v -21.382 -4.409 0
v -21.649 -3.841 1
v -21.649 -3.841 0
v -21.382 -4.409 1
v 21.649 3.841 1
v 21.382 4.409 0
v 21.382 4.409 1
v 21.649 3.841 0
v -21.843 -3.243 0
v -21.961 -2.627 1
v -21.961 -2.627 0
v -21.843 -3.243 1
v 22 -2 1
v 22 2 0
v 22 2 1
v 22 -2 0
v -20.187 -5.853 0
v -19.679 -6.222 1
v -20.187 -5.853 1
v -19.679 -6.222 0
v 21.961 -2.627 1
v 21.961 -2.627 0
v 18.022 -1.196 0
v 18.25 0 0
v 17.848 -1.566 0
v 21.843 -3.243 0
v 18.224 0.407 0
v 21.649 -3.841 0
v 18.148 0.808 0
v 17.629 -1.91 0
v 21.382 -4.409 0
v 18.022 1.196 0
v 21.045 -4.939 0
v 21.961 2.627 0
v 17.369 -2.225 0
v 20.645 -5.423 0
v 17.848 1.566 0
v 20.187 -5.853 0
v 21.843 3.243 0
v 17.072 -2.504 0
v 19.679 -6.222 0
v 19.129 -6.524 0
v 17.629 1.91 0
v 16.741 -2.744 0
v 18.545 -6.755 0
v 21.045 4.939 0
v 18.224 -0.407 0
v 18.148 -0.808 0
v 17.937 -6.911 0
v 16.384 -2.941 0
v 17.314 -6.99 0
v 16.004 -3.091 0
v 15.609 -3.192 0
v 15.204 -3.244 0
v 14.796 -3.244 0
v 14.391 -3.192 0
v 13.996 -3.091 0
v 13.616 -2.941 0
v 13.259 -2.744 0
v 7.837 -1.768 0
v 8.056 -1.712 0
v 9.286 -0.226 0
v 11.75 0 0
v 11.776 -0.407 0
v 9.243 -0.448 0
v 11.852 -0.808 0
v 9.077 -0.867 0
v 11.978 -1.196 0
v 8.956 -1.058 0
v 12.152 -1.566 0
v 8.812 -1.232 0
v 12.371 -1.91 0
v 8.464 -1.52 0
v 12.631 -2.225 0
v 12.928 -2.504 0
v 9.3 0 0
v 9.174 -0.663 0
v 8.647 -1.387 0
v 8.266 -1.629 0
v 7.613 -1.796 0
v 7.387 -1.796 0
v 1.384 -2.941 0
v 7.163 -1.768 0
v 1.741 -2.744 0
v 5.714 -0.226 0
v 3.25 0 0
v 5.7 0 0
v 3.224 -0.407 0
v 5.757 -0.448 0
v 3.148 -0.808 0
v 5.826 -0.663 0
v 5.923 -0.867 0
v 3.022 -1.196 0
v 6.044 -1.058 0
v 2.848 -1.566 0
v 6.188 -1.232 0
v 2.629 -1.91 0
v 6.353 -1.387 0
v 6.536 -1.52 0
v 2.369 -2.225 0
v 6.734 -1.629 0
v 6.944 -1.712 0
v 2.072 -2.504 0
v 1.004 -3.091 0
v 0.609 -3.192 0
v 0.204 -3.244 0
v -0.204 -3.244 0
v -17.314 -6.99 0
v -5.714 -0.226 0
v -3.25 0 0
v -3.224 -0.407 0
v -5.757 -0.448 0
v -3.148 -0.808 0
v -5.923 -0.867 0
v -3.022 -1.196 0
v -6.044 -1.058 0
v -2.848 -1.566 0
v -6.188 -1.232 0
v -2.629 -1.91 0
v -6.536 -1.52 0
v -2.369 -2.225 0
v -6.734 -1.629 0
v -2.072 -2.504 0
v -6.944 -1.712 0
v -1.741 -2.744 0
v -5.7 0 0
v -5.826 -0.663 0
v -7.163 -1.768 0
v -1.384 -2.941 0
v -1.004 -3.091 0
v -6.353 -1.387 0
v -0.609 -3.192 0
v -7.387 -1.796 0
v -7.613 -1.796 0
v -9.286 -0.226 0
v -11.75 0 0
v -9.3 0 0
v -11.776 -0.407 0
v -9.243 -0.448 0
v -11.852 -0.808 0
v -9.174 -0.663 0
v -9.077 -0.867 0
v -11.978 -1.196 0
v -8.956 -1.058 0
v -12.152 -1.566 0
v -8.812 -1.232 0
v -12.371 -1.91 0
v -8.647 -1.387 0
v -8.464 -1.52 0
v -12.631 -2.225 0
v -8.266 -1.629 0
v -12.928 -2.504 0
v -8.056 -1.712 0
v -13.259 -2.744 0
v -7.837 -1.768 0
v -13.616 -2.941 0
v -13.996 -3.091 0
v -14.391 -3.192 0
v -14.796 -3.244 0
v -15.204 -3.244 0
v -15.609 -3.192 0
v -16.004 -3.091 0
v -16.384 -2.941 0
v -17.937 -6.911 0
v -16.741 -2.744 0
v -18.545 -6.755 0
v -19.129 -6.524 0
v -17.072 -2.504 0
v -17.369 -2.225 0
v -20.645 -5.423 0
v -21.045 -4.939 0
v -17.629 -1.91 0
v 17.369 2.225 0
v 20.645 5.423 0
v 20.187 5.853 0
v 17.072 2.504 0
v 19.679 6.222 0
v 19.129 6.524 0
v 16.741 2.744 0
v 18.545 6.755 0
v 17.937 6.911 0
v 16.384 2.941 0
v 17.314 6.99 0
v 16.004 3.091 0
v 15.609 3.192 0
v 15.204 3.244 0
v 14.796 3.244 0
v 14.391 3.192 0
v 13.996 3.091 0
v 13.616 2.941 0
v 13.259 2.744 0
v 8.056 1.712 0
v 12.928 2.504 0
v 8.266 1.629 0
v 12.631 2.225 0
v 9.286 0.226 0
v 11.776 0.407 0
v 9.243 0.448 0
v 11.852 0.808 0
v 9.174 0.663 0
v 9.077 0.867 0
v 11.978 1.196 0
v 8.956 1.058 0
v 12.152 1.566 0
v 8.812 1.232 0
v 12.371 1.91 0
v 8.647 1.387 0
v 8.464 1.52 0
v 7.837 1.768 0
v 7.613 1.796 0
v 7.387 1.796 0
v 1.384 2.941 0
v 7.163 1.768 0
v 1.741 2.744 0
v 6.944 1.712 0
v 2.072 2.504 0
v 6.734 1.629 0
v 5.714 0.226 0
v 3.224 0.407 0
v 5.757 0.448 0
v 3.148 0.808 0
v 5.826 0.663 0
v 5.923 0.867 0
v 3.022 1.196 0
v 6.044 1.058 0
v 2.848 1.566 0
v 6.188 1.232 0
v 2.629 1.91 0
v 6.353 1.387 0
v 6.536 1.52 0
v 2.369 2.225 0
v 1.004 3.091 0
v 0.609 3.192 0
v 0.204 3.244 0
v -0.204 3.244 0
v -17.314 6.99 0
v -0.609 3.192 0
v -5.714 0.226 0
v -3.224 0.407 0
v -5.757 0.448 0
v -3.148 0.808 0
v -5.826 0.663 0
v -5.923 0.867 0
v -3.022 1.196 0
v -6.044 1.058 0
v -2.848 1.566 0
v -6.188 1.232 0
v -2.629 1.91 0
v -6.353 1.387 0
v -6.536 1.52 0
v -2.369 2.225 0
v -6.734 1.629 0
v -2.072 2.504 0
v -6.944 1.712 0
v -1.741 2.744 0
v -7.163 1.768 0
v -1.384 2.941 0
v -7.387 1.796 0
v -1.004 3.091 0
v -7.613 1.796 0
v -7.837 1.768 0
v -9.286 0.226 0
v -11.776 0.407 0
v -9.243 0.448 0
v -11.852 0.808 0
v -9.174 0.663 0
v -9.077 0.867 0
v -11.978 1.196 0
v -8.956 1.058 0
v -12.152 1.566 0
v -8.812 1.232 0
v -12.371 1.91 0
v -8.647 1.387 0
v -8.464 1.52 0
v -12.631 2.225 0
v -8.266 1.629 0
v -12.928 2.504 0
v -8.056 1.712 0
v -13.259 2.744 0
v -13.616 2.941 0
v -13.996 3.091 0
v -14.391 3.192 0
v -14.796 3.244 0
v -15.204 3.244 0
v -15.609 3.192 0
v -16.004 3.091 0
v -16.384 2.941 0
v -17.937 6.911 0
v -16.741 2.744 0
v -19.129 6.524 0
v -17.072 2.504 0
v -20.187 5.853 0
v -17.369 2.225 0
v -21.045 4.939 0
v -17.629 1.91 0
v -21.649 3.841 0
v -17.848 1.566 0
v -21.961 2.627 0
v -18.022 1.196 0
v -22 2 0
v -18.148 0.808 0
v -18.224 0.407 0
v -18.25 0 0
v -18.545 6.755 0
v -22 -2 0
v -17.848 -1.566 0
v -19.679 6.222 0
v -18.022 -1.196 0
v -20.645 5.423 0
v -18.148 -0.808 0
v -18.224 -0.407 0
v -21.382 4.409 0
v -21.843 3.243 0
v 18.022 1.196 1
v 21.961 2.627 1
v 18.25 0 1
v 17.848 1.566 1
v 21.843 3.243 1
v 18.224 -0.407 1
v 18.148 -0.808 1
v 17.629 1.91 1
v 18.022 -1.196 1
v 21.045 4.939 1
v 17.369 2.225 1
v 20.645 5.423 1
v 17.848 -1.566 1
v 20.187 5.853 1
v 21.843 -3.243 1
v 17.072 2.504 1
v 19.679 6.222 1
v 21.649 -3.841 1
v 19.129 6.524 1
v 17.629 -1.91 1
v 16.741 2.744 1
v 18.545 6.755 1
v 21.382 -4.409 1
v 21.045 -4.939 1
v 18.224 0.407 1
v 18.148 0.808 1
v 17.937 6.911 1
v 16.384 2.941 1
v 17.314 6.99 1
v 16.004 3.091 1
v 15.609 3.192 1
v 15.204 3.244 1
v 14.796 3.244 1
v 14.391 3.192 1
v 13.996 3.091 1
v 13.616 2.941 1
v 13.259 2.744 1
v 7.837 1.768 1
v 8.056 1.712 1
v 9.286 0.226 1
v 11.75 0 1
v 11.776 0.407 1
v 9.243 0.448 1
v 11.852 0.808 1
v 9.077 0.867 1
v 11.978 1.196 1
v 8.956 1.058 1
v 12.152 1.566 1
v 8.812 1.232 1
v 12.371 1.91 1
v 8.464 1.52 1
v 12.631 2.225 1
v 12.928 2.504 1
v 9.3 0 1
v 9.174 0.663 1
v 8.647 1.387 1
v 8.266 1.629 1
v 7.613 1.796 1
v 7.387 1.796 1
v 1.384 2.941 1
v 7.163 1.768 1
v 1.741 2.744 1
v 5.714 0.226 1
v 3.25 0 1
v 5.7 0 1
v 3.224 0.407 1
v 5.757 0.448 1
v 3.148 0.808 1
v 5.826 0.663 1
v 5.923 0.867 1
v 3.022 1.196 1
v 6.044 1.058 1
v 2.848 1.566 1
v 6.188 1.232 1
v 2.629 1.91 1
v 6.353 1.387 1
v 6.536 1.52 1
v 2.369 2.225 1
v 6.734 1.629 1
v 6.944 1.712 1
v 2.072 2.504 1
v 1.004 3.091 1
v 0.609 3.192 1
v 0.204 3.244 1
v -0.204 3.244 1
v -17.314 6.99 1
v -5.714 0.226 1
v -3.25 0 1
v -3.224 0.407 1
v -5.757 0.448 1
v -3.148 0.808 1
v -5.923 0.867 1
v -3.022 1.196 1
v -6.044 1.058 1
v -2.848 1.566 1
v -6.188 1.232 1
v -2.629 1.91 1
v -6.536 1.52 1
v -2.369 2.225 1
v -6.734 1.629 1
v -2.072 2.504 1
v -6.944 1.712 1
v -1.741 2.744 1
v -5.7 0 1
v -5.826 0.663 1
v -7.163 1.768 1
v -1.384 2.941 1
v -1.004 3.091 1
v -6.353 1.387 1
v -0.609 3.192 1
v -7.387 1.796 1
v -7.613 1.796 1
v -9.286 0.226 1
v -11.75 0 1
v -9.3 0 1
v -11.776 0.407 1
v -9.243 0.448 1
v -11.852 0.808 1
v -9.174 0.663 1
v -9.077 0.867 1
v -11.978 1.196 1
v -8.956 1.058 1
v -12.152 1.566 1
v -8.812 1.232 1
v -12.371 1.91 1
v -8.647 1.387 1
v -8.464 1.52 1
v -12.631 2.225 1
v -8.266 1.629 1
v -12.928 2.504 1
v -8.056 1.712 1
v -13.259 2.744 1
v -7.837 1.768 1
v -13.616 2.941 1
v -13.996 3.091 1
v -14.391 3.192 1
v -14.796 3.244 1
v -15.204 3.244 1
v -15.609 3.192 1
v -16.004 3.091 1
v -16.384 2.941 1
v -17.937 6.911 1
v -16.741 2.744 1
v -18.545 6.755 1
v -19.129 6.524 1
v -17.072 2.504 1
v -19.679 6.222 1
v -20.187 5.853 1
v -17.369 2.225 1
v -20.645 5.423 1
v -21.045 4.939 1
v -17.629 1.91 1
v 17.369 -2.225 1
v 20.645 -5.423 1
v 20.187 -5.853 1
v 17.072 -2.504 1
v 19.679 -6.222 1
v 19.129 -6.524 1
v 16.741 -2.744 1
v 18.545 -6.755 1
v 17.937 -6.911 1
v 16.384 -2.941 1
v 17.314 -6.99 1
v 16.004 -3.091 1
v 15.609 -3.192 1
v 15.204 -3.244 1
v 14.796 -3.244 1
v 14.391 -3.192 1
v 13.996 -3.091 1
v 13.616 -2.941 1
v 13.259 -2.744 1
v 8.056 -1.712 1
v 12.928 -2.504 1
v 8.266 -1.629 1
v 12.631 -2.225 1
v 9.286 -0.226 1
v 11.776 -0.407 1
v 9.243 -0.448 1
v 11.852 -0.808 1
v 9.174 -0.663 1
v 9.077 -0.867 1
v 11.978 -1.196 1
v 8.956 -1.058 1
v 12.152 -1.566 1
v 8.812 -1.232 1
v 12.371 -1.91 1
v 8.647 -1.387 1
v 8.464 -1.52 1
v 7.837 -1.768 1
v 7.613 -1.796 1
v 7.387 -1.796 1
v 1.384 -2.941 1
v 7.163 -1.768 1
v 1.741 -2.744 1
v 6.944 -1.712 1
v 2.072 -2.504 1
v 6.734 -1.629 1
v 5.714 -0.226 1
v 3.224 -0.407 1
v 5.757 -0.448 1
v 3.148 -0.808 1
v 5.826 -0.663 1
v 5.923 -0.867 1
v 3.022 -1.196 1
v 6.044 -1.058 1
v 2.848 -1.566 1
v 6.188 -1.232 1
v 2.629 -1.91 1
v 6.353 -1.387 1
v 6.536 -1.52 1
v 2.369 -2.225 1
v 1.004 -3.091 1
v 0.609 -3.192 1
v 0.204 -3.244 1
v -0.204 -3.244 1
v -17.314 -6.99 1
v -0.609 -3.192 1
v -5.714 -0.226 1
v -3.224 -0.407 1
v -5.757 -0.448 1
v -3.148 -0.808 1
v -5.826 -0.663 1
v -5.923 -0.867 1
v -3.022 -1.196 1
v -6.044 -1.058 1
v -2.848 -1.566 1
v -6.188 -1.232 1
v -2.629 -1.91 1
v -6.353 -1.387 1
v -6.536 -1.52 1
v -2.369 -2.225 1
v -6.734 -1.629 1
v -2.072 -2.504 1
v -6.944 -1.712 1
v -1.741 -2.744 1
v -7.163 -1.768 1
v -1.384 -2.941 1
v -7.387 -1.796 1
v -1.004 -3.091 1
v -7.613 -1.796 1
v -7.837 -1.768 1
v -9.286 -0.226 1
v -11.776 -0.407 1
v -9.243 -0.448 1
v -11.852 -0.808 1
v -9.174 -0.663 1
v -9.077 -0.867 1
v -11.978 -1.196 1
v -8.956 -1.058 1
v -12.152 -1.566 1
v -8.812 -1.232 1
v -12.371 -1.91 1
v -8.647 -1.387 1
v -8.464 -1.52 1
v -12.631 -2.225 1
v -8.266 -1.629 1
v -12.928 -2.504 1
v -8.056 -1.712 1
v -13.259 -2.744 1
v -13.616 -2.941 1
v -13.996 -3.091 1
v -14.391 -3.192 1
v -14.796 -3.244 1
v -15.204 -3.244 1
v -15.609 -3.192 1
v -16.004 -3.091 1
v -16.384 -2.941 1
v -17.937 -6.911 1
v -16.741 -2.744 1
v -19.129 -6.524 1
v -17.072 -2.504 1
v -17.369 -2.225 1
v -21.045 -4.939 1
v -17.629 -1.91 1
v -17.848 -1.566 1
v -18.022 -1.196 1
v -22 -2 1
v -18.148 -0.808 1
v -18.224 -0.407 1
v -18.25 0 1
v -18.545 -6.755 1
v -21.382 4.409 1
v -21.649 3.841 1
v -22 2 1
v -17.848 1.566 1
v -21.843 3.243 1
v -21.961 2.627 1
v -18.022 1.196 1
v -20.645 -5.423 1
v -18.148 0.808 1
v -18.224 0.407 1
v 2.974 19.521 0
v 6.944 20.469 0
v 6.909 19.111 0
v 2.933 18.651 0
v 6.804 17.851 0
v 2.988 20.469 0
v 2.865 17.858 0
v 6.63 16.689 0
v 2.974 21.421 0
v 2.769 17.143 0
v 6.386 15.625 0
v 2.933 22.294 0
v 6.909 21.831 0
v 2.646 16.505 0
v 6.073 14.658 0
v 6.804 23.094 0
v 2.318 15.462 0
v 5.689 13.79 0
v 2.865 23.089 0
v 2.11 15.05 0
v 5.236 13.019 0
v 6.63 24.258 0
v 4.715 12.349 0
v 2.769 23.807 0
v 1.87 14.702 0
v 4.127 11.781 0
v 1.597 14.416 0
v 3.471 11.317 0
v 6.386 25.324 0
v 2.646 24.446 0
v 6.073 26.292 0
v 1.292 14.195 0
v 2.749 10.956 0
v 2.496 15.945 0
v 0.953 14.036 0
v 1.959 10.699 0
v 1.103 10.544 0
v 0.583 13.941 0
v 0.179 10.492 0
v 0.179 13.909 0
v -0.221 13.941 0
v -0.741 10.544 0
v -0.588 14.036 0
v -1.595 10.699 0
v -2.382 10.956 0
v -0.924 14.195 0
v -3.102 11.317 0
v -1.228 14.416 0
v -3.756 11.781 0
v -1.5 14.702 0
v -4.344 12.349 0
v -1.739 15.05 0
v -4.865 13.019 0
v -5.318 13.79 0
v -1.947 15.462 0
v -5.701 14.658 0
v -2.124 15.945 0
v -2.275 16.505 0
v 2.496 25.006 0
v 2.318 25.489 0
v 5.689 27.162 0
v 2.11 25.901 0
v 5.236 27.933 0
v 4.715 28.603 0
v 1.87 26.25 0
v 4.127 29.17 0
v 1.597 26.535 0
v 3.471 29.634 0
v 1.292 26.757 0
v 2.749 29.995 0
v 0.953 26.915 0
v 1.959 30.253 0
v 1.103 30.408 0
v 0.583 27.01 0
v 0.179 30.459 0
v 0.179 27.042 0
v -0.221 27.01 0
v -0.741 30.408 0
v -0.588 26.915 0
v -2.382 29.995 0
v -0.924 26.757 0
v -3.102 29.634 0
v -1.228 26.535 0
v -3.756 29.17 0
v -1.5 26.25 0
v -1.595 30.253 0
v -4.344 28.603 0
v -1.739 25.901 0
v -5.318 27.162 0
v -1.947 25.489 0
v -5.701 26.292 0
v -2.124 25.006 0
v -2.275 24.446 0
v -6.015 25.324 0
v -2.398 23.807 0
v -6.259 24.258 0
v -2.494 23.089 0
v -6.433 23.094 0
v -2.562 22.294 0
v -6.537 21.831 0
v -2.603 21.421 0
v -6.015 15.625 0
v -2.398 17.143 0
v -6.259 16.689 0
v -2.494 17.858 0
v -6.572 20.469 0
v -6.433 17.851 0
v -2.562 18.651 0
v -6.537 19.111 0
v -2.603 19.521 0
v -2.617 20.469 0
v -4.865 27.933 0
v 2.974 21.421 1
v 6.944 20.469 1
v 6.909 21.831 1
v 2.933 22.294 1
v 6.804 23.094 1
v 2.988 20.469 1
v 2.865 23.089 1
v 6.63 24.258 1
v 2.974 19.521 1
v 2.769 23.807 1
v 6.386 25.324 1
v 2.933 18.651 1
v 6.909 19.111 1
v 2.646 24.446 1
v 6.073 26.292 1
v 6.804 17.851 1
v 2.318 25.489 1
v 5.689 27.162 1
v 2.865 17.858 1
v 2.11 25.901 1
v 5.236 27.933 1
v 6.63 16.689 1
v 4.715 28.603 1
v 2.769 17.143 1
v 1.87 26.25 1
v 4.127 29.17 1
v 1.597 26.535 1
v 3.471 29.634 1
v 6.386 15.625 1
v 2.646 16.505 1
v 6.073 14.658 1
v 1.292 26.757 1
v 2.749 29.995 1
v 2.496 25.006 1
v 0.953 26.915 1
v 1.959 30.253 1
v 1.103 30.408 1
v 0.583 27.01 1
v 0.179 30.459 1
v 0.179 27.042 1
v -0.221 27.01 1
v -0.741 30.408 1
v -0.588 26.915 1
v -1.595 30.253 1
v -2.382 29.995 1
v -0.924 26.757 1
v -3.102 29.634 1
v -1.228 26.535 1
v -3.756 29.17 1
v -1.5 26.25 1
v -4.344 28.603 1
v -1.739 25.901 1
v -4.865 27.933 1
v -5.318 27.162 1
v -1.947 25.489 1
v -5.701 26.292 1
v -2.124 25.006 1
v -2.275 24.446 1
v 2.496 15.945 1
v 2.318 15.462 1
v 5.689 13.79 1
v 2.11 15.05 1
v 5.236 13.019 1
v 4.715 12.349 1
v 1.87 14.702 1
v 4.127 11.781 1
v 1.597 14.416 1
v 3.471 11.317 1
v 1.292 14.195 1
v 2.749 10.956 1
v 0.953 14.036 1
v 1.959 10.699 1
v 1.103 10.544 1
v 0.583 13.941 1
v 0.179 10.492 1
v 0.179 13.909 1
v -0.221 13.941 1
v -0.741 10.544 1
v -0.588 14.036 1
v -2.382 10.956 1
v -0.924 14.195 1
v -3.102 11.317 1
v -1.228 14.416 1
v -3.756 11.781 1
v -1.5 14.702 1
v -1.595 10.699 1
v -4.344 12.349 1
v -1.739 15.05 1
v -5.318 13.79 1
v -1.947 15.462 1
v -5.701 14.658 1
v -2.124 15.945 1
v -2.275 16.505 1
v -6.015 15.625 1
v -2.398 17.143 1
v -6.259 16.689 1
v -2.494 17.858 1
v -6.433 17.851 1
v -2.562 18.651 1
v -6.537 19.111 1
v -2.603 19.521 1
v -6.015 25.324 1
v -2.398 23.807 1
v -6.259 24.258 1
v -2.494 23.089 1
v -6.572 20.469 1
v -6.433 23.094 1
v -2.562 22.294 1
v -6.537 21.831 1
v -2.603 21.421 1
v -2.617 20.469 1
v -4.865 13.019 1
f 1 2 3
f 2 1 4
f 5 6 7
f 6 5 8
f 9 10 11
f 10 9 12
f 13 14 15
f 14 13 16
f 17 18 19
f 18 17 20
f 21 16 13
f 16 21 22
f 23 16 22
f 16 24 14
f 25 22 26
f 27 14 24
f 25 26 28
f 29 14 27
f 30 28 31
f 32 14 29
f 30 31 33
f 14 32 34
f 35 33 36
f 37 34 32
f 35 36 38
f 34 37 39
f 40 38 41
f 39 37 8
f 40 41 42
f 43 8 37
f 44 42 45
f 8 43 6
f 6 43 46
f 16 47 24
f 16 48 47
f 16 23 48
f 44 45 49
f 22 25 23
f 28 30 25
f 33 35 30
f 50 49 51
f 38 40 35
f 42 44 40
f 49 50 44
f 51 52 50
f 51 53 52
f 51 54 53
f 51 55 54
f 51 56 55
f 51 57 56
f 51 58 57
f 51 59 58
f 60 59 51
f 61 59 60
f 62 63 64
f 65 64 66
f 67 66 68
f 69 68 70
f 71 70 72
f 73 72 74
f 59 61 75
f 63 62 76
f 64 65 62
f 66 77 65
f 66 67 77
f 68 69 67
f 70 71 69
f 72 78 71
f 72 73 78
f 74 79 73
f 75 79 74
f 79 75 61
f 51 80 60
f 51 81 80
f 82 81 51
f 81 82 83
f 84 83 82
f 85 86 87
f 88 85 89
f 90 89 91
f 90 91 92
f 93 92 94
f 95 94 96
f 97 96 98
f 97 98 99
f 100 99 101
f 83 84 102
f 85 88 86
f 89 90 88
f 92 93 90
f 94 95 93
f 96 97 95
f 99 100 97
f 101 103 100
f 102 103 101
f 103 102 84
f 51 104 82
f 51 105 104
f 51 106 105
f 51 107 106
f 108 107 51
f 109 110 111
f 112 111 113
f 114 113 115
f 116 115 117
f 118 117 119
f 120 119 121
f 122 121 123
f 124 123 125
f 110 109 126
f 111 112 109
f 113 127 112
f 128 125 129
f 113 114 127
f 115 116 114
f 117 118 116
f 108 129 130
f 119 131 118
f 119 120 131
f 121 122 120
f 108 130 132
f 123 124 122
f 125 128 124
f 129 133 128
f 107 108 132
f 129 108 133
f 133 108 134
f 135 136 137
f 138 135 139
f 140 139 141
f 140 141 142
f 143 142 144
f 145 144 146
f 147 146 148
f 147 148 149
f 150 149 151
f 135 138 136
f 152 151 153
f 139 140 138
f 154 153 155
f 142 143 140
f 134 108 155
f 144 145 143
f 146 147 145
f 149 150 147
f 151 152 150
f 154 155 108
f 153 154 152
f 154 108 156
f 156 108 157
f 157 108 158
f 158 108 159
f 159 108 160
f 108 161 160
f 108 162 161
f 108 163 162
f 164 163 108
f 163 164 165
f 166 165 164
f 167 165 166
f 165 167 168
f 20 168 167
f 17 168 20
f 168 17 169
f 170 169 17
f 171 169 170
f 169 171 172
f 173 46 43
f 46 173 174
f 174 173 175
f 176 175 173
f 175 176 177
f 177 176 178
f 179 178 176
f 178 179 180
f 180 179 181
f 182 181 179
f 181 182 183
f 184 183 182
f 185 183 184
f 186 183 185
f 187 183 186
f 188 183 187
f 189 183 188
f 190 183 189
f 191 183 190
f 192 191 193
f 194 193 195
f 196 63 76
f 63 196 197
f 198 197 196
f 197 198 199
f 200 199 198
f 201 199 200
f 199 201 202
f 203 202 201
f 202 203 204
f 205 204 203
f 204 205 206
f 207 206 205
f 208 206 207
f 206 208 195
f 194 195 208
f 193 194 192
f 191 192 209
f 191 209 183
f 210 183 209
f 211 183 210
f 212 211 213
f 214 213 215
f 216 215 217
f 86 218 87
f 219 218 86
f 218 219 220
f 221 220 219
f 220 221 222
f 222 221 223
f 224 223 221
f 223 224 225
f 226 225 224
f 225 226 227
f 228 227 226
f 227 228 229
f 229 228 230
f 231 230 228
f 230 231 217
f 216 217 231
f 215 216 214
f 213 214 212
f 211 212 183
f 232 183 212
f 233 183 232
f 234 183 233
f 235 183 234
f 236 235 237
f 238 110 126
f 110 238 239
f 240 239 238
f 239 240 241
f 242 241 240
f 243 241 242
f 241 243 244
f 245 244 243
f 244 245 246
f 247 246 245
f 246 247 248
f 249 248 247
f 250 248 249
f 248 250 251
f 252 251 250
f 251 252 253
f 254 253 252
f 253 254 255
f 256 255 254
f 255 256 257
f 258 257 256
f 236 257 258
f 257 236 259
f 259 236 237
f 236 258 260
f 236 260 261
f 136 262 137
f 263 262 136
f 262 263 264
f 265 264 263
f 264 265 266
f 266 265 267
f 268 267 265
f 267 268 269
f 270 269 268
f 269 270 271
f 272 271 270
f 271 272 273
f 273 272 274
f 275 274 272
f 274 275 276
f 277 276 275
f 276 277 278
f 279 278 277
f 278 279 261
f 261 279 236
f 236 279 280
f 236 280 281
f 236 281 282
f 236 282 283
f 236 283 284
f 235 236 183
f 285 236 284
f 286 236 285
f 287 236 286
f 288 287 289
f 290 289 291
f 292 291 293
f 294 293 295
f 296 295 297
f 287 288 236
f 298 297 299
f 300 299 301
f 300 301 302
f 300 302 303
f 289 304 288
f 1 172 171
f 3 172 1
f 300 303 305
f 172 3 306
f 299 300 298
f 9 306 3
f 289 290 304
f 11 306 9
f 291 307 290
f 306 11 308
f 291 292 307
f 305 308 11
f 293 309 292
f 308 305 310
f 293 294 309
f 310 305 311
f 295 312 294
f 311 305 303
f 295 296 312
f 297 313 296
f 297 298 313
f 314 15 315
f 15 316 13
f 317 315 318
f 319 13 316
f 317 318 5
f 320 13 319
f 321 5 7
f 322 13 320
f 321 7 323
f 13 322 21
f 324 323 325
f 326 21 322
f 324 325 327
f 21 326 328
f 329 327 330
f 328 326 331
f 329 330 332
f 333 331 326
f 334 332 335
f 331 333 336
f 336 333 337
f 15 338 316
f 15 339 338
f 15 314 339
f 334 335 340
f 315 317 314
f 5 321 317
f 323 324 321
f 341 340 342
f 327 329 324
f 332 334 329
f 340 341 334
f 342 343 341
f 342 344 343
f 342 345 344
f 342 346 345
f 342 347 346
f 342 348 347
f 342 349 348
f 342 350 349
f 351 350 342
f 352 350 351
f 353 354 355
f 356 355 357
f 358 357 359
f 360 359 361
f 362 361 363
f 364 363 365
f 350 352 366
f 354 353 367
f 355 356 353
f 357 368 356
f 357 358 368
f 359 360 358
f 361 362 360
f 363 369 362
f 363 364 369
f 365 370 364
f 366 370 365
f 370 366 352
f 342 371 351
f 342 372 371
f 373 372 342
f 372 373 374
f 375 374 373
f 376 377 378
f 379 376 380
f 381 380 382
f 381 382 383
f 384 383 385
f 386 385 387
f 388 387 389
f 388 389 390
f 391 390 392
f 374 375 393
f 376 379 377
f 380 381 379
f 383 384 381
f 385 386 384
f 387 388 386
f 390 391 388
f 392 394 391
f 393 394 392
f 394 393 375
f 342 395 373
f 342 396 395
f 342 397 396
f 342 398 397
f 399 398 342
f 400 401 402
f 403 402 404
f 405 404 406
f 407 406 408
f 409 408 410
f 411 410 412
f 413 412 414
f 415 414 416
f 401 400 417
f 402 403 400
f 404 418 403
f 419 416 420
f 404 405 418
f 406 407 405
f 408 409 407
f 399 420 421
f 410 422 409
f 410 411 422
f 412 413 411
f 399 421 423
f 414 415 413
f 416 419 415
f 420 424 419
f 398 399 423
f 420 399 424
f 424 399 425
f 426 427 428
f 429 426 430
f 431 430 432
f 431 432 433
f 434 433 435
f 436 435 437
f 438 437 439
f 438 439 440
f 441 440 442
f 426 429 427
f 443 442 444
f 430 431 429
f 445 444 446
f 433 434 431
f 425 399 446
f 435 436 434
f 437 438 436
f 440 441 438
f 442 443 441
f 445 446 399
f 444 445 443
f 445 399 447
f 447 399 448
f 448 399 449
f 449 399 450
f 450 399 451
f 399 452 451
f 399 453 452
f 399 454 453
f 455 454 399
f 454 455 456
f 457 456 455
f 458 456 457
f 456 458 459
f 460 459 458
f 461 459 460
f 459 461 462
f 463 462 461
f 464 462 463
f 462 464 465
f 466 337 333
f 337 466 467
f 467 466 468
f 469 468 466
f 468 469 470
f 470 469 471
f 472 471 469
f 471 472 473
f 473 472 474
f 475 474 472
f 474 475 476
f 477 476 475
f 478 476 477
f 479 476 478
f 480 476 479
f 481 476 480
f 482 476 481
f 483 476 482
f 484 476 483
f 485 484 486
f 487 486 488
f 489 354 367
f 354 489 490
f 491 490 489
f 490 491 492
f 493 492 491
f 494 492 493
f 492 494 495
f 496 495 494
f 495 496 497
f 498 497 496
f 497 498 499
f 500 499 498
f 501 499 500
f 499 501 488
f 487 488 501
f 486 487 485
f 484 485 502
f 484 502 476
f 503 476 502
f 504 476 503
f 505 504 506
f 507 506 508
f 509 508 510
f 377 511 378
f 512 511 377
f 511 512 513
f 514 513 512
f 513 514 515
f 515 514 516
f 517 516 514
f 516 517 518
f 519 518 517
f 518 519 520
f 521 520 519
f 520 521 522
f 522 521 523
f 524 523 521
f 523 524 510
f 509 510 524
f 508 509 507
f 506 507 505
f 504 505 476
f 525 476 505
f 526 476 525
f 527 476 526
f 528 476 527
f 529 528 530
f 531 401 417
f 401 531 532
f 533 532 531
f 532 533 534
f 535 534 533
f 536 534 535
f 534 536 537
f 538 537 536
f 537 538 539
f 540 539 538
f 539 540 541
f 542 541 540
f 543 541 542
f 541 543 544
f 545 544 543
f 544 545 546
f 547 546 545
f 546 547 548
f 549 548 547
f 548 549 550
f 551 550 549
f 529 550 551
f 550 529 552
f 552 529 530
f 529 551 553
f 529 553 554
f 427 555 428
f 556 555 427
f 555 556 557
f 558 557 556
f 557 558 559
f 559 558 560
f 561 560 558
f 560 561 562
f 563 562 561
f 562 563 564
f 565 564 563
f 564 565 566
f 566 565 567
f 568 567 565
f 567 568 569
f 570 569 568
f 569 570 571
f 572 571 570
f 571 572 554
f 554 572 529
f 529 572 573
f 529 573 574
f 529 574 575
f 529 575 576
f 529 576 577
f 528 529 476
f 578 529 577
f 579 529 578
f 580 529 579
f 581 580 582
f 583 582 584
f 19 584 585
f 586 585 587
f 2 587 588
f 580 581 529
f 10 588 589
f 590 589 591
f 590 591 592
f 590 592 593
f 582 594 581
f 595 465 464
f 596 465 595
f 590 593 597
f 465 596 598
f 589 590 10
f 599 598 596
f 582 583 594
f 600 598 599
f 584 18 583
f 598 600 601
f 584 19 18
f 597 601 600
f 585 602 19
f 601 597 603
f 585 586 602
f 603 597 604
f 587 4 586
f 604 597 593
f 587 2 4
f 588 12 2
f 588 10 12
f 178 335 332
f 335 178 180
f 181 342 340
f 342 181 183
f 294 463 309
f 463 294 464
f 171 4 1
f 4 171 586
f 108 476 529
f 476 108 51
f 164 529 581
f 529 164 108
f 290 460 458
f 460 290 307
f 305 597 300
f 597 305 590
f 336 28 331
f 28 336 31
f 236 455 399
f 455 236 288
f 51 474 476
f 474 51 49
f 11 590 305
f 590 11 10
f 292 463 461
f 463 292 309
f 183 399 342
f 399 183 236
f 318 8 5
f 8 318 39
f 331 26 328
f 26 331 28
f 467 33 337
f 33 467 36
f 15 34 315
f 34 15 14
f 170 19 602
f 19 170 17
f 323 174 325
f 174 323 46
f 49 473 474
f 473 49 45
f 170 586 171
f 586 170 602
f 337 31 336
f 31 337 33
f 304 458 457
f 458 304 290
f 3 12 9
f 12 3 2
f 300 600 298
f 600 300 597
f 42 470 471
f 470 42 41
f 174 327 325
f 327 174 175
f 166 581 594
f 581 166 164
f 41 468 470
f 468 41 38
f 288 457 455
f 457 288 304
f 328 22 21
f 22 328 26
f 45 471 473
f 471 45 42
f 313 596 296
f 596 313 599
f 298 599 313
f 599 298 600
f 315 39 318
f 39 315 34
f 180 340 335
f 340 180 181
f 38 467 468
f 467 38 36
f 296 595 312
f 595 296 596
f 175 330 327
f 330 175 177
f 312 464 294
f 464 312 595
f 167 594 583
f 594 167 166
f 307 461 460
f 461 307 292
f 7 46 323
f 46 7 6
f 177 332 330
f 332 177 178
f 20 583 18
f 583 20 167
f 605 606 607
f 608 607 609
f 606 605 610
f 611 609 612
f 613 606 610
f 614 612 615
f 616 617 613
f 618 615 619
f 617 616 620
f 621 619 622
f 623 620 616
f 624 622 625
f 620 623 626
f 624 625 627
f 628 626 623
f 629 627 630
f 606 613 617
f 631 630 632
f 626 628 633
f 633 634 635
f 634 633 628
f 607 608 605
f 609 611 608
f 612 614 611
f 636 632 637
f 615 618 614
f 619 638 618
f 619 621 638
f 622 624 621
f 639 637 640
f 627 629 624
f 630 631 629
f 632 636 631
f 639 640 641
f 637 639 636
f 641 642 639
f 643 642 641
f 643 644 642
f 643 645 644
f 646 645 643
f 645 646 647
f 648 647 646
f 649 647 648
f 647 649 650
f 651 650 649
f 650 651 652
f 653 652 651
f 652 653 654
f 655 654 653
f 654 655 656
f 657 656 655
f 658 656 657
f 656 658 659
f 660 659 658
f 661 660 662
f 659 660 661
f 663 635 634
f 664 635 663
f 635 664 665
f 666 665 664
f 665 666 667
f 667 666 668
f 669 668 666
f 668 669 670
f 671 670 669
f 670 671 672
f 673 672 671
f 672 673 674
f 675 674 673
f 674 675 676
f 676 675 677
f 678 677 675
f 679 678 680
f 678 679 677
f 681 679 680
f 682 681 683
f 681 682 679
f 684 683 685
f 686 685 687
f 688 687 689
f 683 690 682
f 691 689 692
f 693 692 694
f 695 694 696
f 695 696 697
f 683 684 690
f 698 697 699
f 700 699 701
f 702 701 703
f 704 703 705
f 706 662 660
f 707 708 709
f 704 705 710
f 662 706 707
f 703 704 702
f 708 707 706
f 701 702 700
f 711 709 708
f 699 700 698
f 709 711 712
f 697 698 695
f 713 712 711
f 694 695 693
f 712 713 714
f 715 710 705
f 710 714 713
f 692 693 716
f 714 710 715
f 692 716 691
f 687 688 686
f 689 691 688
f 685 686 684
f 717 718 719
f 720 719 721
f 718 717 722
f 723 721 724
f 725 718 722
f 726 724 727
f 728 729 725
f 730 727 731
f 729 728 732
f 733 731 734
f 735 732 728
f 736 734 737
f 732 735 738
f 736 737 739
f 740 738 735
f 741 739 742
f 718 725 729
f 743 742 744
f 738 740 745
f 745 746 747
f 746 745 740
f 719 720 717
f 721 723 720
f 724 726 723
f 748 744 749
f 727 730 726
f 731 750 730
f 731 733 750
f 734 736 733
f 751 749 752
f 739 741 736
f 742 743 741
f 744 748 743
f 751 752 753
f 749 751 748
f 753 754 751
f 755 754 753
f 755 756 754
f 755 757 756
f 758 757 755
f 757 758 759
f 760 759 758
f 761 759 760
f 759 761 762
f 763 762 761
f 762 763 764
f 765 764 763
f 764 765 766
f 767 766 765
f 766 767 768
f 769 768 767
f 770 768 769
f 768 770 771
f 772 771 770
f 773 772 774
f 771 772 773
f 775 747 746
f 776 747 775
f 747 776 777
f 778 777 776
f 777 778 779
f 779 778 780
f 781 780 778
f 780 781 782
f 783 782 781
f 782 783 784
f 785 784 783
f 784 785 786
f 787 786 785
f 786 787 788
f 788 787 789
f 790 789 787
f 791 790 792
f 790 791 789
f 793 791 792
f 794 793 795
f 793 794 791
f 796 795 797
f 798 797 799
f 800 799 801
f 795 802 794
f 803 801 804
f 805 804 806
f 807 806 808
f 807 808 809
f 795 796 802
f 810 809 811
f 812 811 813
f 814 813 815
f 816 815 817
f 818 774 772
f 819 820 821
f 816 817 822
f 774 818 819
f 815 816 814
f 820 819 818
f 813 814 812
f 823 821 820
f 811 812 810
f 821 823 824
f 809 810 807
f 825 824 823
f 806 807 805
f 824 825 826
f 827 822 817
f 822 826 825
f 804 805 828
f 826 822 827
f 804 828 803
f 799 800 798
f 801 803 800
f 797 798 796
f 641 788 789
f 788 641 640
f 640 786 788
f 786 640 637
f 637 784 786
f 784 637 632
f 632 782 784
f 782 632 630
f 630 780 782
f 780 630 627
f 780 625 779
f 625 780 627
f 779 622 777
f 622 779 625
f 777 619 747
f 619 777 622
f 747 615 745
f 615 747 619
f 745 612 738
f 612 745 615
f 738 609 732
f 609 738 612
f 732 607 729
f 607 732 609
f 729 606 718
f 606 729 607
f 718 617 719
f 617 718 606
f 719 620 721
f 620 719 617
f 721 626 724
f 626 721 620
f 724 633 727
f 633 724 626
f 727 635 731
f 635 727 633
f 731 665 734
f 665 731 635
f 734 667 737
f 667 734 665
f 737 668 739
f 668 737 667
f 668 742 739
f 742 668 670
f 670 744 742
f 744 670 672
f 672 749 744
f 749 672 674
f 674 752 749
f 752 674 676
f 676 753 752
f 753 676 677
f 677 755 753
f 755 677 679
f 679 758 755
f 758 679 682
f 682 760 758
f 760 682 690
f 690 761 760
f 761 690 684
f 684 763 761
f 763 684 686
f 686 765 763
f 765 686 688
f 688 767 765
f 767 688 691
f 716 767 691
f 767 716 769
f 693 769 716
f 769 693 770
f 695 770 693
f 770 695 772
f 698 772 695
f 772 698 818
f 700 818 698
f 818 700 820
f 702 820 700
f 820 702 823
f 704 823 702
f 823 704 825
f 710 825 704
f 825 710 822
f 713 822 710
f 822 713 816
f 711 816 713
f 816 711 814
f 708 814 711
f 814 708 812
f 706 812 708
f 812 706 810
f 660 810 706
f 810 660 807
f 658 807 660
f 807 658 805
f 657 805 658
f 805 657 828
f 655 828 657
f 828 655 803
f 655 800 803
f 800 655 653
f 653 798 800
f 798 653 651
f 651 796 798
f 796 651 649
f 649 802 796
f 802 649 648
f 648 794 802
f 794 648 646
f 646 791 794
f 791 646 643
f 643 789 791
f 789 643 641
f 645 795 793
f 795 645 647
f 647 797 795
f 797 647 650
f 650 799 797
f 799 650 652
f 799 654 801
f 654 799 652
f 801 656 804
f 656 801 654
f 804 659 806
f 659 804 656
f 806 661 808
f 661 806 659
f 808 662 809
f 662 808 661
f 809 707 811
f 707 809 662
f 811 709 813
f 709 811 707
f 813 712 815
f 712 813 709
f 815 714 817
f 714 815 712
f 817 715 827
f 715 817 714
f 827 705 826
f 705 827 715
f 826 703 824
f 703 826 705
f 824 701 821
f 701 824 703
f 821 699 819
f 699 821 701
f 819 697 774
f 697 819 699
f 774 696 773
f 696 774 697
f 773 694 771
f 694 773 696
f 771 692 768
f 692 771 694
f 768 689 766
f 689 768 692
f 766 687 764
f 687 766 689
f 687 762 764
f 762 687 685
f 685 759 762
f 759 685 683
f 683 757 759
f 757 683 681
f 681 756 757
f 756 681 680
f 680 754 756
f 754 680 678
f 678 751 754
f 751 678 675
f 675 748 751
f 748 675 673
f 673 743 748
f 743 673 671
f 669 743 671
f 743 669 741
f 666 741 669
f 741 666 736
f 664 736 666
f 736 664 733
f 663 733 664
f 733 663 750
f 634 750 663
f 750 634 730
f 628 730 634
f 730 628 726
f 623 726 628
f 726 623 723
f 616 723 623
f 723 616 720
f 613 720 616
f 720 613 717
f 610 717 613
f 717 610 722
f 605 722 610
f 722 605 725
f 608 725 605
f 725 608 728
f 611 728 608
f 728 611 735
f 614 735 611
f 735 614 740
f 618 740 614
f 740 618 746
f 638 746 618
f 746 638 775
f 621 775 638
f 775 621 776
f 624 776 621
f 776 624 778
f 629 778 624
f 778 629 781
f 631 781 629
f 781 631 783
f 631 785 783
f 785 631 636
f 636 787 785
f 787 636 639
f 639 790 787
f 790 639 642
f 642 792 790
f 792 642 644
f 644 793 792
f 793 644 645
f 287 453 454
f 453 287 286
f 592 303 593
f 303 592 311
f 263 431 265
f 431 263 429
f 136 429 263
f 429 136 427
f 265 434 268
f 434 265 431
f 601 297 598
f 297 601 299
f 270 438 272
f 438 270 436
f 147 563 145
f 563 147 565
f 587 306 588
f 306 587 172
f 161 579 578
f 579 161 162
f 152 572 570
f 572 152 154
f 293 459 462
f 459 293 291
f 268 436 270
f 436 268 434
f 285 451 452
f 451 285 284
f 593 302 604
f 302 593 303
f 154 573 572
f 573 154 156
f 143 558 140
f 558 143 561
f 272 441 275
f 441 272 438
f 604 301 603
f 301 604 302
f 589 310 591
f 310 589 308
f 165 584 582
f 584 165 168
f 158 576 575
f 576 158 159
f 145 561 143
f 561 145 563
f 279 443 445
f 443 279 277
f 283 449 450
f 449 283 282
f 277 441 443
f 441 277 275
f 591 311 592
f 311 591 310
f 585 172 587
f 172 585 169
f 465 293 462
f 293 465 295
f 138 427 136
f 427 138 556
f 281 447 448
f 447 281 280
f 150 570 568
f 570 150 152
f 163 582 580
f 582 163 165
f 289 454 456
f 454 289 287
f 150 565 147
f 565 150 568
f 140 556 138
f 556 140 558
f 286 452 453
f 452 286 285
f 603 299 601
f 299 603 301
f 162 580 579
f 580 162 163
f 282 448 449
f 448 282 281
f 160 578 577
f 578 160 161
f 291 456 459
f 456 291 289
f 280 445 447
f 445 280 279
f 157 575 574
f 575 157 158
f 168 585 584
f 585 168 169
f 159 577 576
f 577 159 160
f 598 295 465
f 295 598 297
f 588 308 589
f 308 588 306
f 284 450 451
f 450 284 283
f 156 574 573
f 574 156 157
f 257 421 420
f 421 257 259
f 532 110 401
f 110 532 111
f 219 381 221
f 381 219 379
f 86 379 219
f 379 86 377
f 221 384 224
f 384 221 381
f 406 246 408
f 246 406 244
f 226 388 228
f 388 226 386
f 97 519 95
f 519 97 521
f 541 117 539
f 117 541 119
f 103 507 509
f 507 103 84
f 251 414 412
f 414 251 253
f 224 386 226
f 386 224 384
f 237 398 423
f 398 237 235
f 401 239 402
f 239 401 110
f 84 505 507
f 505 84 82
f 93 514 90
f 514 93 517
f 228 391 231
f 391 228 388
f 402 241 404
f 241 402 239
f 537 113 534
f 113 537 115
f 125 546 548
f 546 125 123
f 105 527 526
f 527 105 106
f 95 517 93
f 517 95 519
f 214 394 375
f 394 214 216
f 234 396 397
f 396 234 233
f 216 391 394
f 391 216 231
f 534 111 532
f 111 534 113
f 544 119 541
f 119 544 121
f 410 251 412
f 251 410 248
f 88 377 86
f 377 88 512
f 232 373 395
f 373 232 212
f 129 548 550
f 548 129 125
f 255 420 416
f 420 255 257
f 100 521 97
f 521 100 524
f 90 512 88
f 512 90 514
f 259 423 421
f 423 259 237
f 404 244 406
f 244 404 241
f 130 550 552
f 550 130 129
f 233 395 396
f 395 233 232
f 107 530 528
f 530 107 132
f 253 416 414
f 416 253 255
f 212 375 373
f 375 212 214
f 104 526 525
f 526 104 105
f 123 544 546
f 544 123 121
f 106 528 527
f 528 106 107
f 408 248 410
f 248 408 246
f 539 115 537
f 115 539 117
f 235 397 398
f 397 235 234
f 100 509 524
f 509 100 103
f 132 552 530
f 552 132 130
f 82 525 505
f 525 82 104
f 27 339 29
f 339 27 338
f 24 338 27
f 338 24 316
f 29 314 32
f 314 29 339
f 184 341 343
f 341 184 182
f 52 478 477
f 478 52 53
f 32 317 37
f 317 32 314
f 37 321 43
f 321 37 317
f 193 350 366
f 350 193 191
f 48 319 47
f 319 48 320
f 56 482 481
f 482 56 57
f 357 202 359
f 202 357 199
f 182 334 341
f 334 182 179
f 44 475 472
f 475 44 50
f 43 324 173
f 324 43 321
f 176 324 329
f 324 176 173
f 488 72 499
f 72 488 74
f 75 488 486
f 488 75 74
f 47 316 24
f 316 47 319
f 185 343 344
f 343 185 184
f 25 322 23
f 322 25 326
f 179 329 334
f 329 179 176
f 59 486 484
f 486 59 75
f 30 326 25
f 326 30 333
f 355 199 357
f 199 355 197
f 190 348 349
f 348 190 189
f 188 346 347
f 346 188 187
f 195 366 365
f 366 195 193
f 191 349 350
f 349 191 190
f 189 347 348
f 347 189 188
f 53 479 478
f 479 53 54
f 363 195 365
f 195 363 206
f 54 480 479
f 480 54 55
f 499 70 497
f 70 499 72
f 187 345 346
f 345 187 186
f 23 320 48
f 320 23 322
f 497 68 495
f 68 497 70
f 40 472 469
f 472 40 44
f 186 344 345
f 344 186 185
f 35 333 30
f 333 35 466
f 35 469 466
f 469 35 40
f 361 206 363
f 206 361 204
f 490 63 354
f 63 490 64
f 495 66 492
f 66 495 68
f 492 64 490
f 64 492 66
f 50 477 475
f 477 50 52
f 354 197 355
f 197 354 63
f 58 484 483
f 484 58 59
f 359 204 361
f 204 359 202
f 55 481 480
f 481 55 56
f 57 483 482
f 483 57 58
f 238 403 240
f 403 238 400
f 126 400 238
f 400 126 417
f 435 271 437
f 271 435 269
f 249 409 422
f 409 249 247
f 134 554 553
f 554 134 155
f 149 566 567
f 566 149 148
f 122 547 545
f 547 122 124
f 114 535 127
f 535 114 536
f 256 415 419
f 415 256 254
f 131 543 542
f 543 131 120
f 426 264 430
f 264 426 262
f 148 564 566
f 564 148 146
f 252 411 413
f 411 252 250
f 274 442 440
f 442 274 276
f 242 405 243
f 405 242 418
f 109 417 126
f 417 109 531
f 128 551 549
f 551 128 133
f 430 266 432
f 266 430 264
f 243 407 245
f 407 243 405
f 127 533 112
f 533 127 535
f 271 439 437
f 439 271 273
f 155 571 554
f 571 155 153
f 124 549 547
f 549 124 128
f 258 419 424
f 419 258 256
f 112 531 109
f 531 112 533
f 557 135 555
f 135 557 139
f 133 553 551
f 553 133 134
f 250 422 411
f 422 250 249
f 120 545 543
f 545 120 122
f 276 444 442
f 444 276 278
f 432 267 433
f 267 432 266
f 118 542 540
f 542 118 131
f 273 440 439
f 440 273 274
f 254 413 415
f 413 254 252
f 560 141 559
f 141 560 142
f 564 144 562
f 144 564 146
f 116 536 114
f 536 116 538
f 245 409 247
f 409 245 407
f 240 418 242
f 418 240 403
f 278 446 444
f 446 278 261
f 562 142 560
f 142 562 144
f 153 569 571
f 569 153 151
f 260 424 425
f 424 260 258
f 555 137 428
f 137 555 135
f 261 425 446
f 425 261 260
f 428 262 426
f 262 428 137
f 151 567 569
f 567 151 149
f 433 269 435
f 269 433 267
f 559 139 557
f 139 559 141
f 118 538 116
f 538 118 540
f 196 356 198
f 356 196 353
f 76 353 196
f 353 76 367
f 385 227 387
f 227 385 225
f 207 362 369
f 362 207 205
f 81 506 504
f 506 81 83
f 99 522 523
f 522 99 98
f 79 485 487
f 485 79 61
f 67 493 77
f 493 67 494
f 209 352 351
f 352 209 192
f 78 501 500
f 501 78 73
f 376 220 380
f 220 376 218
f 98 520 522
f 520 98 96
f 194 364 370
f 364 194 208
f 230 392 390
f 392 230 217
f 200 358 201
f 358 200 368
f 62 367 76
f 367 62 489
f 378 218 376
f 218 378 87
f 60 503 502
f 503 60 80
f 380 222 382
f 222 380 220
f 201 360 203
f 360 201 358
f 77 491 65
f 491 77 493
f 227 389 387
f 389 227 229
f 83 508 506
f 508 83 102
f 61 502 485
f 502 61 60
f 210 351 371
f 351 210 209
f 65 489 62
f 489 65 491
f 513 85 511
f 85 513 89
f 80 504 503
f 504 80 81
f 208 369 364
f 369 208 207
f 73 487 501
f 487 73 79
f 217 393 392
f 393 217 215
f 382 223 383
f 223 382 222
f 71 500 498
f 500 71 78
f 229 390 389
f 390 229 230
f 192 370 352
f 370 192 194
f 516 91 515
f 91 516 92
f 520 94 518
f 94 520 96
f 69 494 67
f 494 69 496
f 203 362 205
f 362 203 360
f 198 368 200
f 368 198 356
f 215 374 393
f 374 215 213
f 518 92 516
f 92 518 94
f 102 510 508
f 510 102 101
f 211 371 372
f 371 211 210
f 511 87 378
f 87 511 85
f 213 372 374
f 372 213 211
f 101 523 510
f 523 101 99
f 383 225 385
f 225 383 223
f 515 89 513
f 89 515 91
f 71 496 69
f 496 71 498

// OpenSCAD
$fn = 50;


difference() {
	union() {
		hull() {
			translate(v = [-17.0000000000, 2.0000000000, 0]) {
				cylinder(h = 1, r = 5);
			}
			translate(v = [17.0000000000, 2.0000000000, 0]) {
				cylinder(h = 1, r = 5);
			}
			translate(v = [-17.0000000000, -2.0000000000, 0]) {
				cylinder(h = 1, r = 5);
			}
			translate(v = [17.0000000000, -2.0000000000, 0]) {
				cylinder(h = 1, r = 5);
			}
		}
		translate(v = [0, 30.0000000000, 0]) {
			linear_extrude(height = 1) {
				text(font = "DejaVu Sans Mono:style=Bold", halign = "center", size = 19.0000000000, text = "O", valign = "top");
			}
		}
	}
	union() {
		translate(v = [-15.0000000000, 0.0000000000, 0]) {
			translate(v = [0, 0, -100]) {
				cylinder(h = 200, r = 3.2500000000);
			}
		}
		translate(v = [0, 0, -100]) {
			cylinder(h = 200, r = 3.2500000000);
		}
		translate(v = [15.0000000000, 0.0000000000, 0]) {
			translate(v = [0, 0, -100]) {
				cylinder(h = 200, r = 3.2500000000);
			}
		}
		translate(v = [-15.0000000000, 0.0000000000, 0]) {
			translate(v = [0, 0, -100]) {
				cylinder(h = 200, r = 1.8000000000);
			}
		}
		translate(v = [-7.5000000000, 0.0000000000, 0]) {
			translate(v = [0, 0, -100]) {
				cylinder(h = 200, r = 1.8000000000);
			}
		}
		translate(v = [0, 0, -100]) {
			cylinder(h = 200, r = 1.8000000000);
		}
		translate(v = [7.5000000000, 0.0000000000, 0]) {
			translate(v = [0, 0, -100]) {
				cylinder(h = 200, r = 1.8000000000);
			}
		}
		translate(v = [15.0000000000, 0.0000000000, 0]) {
			translate(v = [0, 0, -100]) {
				cylinder(h = 200, r = 1.8000000000);
			}
		}
	}
}
